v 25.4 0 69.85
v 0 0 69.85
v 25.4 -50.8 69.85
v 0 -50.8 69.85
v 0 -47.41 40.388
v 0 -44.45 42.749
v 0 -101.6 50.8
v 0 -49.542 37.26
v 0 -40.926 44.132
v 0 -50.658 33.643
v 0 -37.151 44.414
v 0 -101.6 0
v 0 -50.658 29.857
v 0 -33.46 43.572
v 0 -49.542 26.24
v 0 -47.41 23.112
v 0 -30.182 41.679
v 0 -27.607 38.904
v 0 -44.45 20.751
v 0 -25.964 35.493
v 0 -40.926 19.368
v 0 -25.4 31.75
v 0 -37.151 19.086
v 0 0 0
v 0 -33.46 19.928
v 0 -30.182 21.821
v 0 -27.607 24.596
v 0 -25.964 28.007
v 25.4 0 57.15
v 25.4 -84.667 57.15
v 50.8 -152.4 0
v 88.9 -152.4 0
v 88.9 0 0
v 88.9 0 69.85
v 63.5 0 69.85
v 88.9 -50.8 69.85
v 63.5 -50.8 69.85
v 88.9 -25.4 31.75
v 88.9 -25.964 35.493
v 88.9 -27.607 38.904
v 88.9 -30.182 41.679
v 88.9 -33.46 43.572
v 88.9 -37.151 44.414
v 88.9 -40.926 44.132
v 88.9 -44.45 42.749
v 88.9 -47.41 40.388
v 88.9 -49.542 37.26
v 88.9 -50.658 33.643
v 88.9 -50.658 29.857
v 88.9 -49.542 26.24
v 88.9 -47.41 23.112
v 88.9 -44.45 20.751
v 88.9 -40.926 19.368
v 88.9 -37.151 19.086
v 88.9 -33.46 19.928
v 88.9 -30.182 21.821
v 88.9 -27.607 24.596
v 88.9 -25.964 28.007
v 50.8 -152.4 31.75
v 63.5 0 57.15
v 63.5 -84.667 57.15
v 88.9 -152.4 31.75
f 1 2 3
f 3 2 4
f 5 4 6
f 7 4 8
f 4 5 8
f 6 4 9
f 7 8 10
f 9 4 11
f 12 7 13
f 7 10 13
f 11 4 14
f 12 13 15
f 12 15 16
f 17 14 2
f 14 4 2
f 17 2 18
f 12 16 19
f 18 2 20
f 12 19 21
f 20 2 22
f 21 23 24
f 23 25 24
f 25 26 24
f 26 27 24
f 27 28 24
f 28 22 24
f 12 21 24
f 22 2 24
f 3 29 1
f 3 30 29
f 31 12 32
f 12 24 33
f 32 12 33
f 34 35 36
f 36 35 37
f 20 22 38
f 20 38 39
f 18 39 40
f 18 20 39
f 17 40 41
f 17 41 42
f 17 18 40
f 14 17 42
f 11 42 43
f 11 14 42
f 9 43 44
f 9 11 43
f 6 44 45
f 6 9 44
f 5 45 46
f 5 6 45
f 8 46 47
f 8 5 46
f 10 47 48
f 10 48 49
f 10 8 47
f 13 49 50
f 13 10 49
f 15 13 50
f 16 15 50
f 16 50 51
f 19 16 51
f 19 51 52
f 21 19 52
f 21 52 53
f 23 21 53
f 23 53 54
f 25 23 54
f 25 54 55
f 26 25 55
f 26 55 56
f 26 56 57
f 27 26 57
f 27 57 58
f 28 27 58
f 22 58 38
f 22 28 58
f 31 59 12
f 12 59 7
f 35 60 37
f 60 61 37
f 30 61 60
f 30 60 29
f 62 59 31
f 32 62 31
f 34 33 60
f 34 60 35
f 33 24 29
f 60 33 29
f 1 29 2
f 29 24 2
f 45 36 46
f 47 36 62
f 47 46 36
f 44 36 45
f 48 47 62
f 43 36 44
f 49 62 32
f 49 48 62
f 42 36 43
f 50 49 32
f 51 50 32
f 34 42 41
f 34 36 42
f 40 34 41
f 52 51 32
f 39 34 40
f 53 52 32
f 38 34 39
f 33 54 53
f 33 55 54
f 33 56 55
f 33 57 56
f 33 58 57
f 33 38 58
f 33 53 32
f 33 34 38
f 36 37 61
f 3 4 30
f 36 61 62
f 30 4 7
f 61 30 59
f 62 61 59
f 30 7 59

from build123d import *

# Parameters (mm, degrees)
F0_R     = 12.7
F1_DEPTH = 88.9
F2_W     = 38.1
F2_H     = 12.7
F3_DEPTH = 101.6
F4_DEPTH = 50.8
F6_DEPTH = 50.801
F8_DEPTH = 88.901


with BuildPart() as f1:
    # F0 (on Right) → F1 (new body)
    with BuildSketch(Plane.YZ):
        Polygon((-101.6, 0), (0, 0), (0, 69.85), (-50.8, 69.85), (-101.6, 50.8), align=None)
        with Locations((-38.1, 31.75)):
            Circle(F0_R, mode=Mode.SUBTRACT)
    extrude(amount=F1_DEPTH)

    # F2 (on face) → F3 (cut)
    with BuildSketch(Plane(origin=(0, 0, 0), x_dir=(-1, 0, 0), z_dir=(0, 1, 0))):
        with Locations((-44.45, 63.5)):
            Rectangle(F2_W, F2_H)
    extrude(amount=-F3_DEPTH, mode=Mode.SUBTRACT)

    # F4 (add): a face of the model
    f4_faces = [f1.faces().sort_by_distance(p)[0] for p in [
        (44.45, -101.6, 25.4),
    ]]
    extrude(f4_faces, amount=F4_DEPTH)

    # F5 (on face) → F6 (cut, through all)
    with BuildSketch(Plane.XY.offset(50.8)):
        Polygon((0, -152.4), (50.8, -152.4), (0, -101.6), align=None)
    extrude(amount=-F6_DEPTH, mode=Mode.SUBTRACT)

    # F7 (on face) → F8 (cut, through all)
    with BuildSketch(Plane.YZ.offset(88.9)):
        Polygon((-152.4, 31.75), (-101.6, 50.8), (-152.4, 50.8), align=None)
    extrude(amount=-F8_DEPTH, mode=Mode.SUBTRACT)


solid = f1.part
